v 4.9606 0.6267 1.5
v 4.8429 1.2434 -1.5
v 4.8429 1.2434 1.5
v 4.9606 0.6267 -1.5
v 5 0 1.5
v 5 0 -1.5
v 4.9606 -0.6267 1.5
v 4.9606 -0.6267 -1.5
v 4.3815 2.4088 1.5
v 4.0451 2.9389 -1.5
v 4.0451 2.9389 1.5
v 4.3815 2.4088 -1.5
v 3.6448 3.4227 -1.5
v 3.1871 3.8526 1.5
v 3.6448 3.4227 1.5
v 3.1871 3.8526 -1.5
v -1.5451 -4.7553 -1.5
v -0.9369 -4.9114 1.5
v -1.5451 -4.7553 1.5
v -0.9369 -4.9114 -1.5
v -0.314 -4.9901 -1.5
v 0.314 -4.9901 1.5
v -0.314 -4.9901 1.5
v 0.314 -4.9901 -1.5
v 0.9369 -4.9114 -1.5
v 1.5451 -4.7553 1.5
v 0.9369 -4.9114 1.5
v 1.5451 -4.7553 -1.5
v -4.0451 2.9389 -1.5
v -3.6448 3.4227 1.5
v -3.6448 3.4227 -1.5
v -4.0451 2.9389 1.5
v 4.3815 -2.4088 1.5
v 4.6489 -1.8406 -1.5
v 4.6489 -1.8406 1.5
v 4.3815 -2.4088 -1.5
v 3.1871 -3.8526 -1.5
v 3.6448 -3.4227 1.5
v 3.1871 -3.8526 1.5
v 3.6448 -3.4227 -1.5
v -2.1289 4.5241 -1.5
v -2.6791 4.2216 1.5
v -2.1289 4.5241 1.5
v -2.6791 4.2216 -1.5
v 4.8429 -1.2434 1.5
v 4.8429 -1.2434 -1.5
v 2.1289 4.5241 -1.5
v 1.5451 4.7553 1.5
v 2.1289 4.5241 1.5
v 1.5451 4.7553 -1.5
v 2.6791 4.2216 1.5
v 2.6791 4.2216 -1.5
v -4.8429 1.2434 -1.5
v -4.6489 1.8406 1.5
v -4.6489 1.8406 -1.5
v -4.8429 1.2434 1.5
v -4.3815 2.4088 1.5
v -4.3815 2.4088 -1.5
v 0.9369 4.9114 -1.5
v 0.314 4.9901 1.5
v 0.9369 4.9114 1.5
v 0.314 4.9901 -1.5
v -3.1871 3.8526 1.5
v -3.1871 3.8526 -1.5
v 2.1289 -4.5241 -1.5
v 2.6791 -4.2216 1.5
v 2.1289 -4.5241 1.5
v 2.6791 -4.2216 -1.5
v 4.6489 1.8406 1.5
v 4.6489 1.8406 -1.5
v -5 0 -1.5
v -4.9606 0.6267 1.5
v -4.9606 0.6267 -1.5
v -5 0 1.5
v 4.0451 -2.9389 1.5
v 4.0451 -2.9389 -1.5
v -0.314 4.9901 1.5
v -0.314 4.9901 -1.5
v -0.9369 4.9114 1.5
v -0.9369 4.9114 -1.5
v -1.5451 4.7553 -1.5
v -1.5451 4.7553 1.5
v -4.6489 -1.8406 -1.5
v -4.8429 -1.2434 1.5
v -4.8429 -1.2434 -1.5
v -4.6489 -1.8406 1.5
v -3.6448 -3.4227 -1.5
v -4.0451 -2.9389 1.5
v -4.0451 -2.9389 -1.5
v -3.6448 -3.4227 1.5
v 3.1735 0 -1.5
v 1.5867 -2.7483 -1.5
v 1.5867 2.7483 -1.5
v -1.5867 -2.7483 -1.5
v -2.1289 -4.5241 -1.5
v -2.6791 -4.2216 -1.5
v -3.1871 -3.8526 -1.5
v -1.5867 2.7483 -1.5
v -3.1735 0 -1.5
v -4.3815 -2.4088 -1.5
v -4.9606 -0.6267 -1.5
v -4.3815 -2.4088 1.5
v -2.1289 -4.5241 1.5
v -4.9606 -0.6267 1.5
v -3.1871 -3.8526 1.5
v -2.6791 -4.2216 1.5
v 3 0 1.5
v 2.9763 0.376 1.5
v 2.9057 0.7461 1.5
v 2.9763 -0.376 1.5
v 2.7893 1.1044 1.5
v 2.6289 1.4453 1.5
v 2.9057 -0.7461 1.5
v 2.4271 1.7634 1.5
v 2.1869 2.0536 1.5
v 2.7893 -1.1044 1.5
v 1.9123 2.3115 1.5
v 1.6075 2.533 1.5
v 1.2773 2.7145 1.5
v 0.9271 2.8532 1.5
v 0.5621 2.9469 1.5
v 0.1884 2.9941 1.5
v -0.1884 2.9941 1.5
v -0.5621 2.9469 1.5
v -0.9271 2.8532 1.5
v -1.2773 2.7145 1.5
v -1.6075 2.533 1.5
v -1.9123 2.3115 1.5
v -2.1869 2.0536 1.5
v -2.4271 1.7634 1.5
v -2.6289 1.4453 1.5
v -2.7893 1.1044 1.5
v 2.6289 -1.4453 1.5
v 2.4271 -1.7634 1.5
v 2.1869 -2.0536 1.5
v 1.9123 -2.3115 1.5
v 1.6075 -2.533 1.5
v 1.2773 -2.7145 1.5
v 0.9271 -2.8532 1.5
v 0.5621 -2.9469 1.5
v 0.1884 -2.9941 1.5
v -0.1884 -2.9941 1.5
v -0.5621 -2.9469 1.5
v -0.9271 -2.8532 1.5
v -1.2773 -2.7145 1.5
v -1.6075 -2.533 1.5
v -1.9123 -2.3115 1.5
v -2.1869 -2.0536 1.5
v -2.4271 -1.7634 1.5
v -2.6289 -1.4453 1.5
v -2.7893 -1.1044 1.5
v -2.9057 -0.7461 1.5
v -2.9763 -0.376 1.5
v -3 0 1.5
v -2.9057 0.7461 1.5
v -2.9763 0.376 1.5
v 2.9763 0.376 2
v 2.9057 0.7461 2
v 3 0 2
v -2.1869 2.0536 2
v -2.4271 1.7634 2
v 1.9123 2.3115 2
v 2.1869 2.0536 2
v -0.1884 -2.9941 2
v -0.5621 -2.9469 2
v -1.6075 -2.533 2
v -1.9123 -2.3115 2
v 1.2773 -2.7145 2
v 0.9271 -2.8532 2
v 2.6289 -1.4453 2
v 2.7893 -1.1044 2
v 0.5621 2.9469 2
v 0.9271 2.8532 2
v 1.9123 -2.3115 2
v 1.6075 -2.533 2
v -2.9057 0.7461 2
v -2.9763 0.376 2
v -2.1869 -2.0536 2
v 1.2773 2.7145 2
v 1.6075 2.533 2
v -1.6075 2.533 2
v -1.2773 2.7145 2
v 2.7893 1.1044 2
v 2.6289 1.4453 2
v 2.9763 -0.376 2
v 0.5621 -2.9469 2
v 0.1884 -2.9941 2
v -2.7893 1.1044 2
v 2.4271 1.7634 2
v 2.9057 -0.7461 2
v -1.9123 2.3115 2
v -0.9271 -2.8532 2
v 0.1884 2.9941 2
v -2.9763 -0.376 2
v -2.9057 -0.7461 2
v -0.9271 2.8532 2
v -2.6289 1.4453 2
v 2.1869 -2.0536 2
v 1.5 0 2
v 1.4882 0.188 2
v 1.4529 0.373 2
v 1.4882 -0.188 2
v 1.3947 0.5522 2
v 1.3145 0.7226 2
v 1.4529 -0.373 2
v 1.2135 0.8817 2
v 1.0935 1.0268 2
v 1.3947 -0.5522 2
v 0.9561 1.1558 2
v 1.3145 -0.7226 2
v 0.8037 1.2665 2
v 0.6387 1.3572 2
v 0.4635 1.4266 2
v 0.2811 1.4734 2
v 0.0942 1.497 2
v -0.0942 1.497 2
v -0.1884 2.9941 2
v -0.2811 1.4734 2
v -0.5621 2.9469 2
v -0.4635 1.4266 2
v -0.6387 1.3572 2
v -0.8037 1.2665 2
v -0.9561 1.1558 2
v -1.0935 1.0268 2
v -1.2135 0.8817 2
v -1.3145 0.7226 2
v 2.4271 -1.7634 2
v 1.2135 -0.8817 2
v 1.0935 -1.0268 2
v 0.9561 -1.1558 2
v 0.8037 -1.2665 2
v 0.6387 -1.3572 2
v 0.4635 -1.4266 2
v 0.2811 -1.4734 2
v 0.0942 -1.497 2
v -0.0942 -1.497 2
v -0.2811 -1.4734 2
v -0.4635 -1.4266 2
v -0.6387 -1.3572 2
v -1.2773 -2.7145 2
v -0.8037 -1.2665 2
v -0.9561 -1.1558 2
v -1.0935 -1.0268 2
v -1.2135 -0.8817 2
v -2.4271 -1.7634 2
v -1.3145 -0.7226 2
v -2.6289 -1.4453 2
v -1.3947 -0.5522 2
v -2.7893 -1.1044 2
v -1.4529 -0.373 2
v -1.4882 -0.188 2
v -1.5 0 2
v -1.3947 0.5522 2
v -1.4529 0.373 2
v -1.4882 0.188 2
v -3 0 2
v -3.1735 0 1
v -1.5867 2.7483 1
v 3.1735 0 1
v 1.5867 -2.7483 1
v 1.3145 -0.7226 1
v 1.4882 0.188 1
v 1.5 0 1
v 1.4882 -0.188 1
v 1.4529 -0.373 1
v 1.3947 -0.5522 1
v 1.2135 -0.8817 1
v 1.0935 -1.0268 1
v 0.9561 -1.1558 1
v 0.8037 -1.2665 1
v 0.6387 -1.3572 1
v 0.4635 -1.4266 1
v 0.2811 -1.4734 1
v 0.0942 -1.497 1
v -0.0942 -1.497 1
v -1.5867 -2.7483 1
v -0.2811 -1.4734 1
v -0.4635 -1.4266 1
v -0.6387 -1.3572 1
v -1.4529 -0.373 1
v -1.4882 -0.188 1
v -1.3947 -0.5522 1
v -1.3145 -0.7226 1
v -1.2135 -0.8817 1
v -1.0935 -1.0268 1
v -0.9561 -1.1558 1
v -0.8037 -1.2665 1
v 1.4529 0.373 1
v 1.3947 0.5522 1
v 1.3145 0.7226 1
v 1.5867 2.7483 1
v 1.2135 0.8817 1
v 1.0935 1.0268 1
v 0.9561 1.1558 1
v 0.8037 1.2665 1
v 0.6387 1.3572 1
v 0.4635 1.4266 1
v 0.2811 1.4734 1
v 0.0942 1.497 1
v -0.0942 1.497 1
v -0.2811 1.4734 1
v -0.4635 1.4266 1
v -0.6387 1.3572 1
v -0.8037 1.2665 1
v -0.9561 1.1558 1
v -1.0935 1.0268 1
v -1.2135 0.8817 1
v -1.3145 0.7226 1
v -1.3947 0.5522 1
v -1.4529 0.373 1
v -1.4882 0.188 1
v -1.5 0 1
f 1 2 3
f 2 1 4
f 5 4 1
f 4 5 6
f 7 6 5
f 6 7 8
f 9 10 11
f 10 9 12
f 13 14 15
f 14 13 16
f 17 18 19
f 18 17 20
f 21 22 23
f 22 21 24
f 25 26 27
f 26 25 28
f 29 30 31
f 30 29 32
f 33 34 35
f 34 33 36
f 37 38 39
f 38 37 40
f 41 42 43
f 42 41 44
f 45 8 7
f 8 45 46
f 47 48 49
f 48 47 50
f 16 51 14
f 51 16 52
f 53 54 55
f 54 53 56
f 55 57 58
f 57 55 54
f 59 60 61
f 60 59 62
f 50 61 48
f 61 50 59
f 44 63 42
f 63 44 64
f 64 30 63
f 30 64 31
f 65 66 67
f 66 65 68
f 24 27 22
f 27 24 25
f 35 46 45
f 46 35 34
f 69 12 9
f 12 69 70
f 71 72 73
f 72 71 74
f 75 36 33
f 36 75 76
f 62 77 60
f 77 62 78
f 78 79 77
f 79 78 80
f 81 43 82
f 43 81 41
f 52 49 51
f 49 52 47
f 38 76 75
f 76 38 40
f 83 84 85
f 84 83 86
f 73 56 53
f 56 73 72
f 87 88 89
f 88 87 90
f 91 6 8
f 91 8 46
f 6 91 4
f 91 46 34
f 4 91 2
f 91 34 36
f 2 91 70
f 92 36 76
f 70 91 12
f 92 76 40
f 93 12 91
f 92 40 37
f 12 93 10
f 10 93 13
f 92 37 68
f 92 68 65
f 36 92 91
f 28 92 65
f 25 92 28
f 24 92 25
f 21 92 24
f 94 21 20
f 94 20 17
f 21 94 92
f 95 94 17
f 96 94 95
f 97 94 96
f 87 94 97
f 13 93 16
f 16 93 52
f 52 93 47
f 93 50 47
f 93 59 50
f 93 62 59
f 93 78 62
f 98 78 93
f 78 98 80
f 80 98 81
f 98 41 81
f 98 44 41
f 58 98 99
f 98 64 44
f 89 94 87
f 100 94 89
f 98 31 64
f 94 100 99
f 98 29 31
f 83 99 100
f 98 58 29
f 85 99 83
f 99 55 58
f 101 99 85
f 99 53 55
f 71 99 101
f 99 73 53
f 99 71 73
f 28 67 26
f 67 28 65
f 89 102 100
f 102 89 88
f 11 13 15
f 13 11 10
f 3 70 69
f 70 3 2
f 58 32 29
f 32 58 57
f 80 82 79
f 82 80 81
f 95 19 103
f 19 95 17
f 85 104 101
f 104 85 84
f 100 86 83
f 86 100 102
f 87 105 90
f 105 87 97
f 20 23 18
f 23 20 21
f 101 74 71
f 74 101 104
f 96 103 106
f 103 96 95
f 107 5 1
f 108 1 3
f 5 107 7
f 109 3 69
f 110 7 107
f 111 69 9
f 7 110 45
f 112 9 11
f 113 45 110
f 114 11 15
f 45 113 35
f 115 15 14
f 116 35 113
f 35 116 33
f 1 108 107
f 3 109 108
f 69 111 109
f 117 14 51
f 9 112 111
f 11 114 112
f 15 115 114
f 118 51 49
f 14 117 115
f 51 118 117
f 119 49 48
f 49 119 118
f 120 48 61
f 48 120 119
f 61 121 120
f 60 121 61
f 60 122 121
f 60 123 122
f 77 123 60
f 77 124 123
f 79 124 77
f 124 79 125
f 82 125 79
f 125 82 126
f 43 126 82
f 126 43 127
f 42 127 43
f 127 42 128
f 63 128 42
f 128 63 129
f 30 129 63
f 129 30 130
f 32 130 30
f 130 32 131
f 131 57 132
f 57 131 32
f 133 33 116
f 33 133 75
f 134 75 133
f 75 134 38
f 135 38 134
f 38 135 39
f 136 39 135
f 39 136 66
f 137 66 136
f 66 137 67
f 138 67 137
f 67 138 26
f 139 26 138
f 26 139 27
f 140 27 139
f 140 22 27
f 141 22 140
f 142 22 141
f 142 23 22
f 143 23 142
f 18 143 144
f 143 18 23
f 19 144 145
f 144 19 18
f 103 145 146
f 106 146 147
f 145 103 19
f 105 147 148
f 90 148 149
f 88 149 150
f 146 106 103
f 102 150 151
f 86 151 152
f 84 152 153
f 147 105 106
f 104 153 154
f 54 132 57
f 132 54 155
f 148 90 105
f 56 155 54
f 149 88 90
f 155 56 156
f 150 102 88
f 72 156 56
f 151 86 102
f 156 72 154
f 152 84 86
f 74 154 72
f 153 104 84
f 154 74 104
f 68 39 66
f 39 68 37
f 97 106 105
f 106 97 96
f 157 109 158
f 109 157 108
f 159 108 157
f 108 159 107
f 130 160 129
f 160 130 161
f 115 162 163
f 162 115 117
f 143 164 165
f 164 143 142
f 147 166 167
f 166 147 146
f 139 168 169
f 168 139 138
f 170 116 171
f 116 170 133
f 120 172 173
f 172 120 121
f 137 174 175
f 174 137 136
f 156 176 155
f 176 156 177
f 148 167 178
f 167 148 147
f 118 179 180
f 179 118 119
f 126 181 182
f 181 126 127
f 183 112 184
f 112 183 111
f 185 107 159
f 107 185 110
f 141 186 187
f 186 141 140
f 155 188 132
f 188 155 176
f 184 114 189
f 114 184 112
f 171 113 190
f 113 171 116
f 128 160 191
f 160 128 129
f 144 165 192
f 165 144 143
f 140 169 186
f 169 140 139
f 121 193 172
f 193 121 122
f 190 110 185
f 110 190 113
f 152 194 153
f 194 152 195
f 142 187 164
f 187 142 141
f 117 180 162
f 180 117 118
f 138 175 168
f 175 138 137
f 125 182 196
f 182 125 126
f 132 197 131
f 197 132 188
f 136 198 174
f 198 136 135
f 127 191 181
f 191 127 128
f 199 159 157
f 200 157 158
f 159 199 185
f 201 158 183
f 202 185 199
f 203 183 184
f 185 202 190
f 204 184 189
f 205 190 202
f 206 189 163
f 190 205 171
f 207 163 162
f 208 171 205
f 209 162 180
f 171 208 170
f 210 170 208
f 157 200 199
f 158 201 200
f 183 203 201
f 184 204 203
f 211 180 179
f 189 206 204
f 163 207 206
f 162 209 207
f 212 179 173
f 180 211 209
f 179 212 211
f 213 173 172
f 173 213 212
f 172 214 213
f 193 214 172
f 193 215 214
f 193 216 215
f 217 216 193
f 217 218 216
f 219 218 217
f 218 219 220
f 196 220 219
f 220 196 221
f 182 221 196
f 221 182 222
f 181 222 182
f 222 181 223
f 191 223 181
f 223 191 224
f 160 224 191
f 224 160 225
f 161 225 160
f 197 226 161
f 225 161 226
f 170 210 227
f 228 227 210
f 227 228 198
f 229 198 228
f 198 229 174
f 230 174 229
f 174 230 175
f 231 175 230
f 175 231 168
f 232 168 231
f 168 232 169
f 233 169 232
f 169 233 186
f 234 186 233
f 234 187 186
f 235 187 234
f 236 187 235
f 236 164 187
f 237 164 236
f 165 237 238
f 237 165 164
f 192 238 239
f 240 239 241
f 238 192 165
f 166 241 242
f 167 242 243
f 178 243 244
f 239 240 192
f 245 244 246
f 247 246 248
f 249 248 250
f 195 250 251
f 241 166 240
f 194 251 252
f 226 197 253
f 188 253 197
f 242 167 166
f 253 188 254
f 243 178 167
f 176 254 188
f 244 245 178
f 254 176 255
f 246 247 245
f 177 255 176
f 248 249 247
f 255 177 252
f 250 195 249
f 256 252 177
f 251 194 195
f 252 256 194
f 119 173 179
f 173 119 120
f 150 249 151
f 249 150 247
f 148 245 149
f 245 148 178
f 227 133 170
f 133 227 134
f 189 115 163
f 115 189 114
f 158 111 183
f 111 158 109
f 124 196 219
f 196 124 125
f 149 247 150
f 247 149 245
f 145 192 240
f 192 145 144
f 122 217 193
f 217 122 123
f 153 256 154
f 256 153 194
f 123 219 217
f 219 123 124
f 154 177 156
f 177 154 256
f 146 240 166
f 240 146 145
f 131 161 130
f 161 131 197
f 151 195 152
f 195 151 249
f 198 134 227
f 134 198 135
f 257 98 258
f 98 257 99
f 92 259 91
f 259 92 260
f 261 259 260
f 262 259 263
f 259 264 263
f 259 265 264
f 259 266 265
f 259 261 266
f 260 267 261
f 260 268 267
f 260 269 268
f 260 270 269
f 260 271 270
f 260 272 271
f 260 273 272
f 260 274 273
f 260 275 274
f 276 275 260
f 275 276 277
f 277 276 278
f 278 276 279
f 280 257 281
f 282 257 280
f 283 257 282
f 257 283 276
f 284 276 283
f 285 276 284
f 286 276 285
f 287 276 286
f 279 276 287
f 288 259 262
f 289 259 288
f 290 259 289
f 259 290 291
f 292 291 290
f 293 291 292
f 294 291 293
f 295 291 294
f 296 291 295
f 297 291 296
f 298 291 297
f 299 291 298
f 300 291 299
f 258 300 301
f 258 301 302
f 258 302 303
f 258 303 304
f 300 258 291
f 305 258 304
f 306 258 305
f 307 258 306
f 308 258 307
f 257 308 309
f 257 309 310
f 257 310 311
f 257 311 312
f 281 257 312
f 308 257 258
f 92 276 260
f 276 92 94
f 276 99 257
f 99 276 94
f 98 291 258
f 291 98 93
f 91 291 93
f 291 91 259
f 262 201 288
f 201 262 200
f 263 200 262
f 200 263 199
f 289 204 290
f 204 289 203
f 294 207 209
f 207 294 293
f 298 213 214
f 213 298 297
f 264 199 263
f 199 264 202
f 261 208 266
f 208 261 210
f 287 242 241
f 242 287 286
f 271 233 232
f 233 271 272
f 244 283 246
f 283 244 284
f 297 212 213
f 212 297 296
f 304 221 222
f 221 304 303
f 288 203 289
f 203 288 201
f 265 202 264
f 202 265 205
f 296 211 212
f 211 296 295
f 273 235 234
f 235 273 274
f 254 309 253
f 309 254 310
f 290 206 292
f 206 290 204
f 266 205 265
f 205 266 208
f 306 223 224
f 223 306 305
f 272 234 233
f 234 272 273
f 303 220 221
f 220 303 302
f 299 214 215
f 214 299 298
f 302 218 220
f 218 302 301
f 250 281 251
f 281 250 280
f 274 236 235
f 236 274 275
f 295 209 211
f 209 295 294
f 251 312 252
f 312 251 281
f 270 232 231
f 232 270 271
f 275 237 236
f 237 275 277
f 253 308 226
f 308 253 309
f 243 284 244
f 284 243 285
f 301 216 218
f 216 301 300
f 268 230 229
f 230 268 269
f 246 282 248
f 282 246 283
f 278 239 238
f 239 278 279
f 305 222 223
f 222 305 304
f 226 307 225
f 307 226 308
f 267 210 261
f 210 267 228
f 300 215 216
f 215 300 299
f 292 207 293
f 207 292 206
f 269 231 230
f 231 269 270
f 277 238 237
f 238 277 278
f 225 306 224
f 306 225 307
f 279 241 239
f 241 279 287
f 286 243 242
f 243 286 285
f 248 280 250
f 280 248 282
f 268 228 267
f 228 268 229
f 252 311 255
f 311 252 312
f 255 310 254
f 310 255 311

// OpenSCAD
$fn = 50;


difference() {
	union() {
		translate(v = [0, 0, -1.5000000000]) {
			cylinder(h = 3, r = 5.0000000000);
		}
		translate(v = [0, 0, -1.5000000000]) {
			cylinder(h = 3.5000000000, r = 3.0000000000);
		}
	}
	union() {
		translate(v = [0, 0, -1.5000000000]) {
			rotate(a = [0, 0, 0]) {
				difference() {
					union() {
						#linear_extrude(height = 2.5000000000) {
							polygon(points = [[3.1735000000, 0.0000000000], [1.5867500000, 2.7483316189], [-1.5867500000, 2.7483316189], [-3.1735000000, 0.0000000000], [-1.5867500000, -2.7483316189], [1.5867500000, -2.7483316189]]);
						}
					}
					union();
				}
			}
		}
		translate(v = [0, 0, -50.0000000000]) {
			cylinder(h = 100, r = 1.5000000000);
		}
	}
}
